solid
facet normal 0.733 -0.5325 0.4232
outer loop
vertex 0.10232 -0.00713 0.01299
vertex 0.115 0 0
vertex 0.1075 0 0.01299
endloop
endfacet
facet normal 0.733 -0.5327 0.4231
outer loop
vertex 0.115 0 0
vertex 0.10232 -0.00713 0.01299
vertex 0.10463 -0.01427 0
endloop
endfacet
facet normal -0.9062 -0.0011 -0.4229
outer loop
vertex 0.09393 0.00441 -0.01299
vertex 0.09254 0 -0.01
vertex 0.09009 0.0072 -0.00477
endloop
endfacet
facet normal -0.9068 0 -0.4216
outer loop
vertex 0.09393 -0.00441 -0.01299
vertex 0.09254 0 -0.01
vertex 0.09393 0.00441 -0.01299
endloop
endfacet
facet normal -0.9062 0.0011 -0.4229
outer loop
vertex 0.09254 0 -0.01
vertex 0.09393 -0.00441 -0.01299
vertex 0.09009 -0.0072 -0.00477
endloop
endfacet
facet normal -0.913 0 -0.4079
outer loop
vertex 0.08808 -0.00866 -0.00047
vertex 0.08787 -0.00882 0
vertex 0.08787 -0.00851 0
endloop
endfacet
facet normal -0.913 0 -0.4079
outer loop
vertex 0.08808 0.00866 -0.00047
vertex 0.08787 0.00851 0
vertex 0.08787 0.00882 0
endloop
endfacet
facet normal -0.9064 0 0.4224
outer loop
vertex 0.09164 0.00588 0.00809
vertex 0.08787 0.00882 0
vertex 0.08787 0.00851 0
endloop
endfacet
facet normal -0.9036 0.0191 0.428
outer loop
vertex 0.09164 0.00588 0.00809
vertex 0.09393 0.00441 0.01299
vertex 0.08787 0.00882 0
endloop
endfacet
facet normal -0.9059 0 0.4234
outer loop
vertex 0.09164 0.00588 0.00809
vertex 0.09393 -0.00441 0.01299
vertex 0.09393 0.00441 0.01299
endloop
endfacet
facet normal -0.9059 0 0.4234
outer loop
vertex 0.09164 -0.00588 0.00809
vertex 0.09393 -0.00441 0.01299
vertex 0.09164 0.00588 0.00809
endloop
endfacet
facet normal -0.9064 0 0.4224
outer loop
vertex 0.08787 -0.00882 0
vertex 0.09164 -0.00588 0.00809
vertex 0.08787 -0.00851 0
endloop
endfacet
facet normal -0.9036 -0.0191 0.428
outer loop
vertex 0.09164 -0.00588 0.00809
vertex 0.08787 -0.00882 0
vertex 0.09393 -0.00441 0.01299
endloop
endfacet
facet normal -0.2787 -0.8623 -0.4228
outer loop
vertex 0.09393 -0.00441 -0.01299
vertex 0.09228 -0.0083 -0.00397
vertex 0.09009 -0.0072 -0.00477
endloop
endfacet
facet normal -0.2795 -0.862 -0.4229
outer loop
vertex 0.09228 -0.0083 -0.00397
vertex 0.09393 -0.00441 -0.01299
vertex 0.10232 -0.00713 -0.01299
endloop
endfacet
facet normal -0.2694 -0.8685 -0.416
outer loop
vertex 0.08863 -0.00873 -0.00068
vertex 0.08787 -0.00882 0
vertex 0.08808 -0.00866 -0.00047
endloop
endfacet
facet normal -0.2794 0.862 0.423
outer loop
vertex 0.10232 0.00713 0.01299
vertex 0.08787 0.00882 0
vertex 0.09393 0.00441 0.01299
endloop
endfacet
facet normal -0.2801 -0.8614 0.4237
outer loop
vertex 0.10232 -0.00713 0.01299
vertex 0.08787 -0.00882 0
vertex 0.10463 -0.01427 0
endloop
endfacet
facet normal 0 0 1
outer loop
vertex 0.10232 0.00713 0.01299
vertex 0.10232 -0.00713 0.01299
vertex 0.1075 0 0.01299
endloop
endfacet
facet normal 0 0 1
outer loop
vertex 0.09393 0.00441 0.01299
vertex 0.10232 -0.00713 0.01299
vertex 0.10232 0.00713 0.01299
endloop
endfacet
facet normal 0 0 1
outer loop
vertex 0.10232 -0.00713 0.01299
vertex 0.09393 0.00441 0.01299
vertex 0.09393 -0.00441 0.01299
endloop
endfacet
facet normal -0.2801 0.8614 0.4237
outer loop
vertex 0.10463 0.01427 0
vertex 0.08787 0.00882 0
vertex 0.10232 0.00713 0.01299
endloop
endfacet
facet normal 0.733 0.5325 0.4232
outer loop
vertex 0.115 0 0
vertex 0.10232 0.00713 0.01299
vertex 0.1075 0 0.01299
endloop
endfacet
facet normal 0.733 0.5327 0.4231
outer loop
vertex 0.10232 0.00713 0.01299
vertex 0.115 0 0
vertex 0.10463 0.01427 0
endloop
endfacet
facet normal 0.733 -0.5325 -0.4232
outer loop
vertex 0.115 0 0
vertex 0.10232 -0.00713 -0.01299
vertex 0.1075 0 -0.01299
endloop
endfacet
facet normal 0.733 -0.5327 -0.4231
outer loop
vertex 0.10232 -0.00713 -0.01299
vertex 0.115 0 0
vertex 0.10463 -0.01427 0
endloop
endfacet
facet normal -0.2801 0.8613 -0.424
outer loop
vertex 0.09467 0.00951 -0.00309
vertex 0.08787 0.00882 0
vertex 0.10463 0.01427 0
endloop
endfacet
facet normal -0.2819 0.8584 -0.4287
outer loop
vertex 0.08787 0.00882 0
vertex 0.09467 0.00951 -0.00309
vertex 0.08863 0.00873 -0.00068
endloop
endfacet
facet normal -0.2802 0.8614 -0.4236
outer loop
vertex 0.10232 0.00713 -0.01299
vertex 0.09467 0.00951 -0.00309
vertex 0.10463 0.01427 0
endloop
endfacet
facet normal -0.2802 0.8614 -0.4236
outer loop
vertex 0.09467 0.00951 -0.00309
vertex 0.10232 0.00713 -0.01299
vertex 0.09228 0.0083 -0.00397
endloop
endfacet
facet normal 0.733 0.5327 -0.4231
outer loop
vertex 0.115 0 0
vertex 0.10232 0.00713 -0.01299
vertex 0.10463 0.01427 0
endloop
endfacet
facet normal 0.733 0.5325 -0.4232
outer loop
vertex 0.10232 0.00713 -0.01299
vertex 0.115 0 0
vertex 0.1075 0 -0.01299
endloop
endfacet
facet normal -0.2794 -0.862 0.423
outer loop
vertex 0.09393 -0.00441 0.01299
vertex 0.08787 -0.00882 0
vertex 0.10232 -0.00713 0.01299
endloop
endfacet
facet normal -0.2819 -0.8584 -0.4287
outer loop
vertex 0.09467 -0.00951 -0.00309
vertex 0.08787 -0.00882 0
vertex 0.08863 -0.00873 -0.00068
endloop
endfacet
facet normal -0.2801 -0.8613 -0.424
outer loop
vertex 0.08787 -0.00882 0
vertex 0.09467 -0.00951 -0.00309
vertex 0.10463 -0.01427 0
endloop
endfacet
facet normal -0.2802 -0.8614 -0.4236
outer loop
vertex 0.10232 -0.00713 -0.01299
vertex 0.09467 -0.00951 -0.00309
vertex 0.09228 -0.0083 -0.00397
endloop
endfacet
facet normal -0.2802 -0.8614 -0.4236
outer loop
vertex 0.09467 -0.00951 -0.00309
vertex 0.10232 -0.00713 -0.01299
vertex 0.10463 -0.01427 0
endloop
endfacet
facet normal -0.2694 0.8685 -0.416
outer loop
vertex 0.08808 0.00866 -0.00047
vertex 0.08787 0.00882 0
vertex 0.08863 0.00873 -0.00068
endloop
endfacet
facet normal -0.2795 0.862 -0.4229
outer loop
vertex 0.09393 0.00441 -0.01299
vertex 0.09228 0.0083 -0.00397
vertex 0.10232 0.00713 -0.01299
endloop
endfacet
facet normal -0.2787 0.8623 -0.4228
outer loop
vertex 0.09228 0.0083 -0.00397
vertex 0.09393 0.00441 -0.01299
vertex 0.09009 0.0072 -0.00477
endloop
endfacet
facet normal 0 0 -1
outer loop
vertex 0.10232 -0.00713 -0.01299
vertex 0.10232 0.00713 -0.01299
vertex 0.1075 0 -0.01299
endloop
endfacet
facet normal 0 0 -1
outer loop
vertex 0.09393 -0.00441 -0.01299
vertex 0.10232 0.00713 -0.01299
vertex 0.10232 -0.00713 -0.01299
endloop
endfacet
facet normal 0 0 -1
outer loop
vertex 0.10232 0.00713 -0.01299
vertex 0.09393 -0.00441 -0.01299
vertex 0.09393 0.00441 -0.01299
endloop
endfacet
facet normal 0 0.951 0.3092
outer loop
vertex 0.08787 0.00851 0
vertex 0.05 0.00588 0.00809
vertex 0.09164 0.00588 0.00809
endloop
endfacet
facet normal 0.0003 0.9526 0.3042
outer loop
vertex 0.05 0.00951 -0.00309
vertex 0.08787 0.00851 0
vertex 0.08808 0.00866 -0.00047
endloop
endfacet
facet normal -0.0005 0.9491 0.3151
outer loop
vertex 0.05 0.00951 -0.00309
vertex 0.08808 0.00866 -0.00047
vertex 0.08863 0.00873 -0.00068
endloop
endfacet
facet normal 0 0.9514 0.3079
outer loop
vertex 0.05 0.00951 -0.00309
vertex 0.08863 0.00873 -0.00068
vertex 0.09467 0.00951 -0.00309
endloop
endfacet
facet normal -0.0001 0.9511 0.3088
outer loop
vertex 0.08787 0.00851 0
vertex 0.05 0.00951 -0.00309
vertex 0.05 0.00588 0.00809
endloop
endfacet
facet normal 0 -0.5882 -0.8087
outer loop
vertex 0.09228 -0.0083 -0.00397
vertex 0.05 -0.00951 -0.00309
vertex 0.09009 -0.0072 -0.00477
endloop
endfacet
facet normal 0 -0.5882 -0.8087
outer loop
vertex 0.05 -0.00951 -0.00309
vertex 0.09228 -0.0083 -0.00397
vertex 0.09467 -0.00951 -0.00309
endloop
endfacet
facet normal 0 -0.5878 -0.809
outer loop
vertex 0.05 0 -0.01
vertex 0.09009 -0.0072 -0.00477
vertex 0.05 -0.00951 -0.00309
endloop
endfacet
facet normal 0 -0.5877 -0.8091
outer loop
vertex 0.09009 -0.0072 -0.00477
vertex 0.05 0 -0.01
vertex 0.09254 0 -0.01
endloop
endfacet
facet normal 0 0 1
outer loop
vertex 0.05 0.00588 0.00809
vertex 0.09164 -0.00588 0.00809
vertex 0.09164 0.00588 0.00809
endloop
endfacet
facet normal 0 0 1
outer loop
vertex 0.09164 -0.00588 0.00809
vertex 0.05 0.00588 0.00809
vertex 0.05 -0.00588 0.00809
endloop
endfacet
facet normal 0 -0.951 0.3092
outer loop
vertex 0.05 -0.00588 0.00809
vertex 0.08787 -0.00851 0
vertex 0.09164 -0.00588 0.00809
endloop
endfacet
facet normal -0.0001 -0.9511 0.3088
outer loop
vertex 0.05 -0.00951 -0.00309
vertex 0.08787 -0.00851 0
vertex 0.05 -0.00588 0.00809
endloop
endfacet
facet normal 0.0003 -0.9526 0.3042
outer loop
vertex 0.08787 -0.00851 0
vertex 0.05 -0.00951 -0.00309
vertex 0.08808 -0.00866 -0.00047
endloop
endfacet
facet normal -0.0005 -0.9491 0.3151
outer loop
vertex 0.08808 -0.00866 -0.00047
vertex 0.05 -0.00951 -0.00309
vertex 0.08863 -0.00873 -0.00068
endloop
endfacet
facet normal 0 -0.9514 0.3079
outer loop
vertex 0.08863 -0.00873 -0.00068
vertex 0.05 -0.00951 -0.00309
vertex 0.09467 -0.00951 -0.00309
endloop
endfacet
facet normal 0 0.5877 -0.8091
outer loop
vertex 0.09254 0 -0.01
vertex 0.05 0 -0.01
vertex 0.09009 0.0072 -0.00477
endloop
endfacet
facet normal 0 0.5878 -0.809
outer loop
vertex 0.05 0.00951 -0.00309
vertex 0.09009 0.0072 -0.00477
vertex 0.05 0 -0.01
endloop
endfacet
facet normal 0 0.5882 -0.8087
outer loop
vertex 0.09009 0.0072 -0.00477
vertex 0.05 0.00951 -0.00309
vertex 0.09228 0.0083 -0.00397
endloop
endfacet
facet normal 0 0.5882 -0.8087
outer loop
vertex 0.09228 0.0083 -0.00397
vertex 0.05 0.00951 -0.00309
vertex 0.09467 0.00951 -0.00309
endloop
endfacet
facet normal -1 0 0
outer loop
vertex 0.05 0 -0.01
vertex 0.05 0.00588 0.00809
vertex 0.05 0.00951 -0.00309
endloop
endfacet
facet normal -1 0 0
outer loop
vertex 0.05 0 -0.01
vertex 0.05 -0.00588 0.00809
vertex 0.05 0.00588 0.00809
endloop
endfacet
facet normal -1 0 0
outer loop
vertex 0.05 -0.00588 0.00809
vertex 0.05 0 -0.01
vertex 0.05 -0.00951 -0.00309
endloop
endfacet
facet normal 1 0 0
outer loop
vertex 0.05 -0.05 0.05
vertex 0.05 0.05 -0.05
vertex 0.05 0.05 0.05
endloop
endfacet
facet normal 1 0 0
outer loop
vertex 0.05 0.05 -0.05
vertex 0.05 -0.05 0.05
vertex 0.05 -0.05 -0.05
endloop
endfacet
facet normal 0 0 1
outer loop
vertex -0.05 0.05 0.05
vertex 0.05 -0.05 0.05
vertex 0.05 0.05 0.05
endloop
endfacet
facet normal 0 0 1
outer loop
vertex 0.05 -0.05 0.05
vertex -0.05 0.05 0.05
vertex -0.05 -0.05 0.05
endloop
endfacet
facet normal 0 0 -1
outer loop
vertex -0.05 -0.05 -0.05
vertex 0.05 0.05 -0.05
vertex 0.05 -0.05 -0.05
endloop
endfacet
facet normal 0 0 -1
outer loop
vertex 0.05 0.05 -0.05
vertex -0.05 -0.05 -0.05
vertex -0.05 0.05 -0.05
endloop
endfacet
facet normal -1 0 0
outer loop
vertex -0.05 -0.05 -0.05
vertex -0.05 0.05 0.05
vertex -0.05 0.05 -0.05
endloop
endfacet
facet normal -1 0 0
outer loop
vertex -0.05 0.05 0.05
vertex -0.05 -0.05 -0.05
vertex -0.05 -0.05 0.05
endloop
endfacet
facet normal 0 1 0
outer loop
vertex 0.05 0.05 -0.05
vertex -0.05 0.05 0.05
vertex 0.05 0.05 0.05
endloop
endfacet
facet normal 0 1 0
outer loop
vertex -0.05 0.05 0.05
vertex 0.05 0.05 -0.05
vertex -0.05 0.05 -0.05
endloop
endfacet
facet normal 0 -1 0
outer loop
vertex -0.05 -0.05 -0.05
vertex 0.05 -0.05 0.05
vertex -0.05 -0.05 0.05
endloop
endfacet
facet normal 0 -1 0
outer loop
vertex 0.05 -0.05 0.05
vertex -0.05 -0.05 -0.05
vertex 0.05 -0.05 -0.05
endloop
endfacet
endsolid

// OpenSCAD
// file: common.scad
grid_size = 0.1;
wire_radius = 0.01;

module place_cuboid(low_x, high_x, low_y, high_y, low_z, high_z) {
    translate([low_x, low_y, low_z]) {
        cube([high_x - low_x, high_y - low_y, high_z - low_z], false);
    };
}

module debug_grid() {
    for (x = [-3,-2,-1,0,1,2]) {
        for (z = [-3,-2,-1,0,1,2]) {
            place_cuboid(x * grid_size - 0.005, x * grid_size + 0.005,
                         -grid_size, grid_size,
                         z * grid_size - 0.005, z * grid_size + 0.005);
        }
    }
}
// main file
include <common.scad>

module main() {
    union() {
        place_cuboid(-grid_size / 2, grid_size / 2, -grid_size / 2, grid_size / 2, -grid_size / 2, grid_size / 2);
        translate([grid_size, 0, 0]) {
            sphere(r=wire_radius*1.5);
            rotate([0, -90, 0]) {
                rotate([0, 0, 180]) {
                    cylinder(grid_size / 2, r1=wire_radius, r2=wire_radius);
                }
            }
        }
    }
}

main();
